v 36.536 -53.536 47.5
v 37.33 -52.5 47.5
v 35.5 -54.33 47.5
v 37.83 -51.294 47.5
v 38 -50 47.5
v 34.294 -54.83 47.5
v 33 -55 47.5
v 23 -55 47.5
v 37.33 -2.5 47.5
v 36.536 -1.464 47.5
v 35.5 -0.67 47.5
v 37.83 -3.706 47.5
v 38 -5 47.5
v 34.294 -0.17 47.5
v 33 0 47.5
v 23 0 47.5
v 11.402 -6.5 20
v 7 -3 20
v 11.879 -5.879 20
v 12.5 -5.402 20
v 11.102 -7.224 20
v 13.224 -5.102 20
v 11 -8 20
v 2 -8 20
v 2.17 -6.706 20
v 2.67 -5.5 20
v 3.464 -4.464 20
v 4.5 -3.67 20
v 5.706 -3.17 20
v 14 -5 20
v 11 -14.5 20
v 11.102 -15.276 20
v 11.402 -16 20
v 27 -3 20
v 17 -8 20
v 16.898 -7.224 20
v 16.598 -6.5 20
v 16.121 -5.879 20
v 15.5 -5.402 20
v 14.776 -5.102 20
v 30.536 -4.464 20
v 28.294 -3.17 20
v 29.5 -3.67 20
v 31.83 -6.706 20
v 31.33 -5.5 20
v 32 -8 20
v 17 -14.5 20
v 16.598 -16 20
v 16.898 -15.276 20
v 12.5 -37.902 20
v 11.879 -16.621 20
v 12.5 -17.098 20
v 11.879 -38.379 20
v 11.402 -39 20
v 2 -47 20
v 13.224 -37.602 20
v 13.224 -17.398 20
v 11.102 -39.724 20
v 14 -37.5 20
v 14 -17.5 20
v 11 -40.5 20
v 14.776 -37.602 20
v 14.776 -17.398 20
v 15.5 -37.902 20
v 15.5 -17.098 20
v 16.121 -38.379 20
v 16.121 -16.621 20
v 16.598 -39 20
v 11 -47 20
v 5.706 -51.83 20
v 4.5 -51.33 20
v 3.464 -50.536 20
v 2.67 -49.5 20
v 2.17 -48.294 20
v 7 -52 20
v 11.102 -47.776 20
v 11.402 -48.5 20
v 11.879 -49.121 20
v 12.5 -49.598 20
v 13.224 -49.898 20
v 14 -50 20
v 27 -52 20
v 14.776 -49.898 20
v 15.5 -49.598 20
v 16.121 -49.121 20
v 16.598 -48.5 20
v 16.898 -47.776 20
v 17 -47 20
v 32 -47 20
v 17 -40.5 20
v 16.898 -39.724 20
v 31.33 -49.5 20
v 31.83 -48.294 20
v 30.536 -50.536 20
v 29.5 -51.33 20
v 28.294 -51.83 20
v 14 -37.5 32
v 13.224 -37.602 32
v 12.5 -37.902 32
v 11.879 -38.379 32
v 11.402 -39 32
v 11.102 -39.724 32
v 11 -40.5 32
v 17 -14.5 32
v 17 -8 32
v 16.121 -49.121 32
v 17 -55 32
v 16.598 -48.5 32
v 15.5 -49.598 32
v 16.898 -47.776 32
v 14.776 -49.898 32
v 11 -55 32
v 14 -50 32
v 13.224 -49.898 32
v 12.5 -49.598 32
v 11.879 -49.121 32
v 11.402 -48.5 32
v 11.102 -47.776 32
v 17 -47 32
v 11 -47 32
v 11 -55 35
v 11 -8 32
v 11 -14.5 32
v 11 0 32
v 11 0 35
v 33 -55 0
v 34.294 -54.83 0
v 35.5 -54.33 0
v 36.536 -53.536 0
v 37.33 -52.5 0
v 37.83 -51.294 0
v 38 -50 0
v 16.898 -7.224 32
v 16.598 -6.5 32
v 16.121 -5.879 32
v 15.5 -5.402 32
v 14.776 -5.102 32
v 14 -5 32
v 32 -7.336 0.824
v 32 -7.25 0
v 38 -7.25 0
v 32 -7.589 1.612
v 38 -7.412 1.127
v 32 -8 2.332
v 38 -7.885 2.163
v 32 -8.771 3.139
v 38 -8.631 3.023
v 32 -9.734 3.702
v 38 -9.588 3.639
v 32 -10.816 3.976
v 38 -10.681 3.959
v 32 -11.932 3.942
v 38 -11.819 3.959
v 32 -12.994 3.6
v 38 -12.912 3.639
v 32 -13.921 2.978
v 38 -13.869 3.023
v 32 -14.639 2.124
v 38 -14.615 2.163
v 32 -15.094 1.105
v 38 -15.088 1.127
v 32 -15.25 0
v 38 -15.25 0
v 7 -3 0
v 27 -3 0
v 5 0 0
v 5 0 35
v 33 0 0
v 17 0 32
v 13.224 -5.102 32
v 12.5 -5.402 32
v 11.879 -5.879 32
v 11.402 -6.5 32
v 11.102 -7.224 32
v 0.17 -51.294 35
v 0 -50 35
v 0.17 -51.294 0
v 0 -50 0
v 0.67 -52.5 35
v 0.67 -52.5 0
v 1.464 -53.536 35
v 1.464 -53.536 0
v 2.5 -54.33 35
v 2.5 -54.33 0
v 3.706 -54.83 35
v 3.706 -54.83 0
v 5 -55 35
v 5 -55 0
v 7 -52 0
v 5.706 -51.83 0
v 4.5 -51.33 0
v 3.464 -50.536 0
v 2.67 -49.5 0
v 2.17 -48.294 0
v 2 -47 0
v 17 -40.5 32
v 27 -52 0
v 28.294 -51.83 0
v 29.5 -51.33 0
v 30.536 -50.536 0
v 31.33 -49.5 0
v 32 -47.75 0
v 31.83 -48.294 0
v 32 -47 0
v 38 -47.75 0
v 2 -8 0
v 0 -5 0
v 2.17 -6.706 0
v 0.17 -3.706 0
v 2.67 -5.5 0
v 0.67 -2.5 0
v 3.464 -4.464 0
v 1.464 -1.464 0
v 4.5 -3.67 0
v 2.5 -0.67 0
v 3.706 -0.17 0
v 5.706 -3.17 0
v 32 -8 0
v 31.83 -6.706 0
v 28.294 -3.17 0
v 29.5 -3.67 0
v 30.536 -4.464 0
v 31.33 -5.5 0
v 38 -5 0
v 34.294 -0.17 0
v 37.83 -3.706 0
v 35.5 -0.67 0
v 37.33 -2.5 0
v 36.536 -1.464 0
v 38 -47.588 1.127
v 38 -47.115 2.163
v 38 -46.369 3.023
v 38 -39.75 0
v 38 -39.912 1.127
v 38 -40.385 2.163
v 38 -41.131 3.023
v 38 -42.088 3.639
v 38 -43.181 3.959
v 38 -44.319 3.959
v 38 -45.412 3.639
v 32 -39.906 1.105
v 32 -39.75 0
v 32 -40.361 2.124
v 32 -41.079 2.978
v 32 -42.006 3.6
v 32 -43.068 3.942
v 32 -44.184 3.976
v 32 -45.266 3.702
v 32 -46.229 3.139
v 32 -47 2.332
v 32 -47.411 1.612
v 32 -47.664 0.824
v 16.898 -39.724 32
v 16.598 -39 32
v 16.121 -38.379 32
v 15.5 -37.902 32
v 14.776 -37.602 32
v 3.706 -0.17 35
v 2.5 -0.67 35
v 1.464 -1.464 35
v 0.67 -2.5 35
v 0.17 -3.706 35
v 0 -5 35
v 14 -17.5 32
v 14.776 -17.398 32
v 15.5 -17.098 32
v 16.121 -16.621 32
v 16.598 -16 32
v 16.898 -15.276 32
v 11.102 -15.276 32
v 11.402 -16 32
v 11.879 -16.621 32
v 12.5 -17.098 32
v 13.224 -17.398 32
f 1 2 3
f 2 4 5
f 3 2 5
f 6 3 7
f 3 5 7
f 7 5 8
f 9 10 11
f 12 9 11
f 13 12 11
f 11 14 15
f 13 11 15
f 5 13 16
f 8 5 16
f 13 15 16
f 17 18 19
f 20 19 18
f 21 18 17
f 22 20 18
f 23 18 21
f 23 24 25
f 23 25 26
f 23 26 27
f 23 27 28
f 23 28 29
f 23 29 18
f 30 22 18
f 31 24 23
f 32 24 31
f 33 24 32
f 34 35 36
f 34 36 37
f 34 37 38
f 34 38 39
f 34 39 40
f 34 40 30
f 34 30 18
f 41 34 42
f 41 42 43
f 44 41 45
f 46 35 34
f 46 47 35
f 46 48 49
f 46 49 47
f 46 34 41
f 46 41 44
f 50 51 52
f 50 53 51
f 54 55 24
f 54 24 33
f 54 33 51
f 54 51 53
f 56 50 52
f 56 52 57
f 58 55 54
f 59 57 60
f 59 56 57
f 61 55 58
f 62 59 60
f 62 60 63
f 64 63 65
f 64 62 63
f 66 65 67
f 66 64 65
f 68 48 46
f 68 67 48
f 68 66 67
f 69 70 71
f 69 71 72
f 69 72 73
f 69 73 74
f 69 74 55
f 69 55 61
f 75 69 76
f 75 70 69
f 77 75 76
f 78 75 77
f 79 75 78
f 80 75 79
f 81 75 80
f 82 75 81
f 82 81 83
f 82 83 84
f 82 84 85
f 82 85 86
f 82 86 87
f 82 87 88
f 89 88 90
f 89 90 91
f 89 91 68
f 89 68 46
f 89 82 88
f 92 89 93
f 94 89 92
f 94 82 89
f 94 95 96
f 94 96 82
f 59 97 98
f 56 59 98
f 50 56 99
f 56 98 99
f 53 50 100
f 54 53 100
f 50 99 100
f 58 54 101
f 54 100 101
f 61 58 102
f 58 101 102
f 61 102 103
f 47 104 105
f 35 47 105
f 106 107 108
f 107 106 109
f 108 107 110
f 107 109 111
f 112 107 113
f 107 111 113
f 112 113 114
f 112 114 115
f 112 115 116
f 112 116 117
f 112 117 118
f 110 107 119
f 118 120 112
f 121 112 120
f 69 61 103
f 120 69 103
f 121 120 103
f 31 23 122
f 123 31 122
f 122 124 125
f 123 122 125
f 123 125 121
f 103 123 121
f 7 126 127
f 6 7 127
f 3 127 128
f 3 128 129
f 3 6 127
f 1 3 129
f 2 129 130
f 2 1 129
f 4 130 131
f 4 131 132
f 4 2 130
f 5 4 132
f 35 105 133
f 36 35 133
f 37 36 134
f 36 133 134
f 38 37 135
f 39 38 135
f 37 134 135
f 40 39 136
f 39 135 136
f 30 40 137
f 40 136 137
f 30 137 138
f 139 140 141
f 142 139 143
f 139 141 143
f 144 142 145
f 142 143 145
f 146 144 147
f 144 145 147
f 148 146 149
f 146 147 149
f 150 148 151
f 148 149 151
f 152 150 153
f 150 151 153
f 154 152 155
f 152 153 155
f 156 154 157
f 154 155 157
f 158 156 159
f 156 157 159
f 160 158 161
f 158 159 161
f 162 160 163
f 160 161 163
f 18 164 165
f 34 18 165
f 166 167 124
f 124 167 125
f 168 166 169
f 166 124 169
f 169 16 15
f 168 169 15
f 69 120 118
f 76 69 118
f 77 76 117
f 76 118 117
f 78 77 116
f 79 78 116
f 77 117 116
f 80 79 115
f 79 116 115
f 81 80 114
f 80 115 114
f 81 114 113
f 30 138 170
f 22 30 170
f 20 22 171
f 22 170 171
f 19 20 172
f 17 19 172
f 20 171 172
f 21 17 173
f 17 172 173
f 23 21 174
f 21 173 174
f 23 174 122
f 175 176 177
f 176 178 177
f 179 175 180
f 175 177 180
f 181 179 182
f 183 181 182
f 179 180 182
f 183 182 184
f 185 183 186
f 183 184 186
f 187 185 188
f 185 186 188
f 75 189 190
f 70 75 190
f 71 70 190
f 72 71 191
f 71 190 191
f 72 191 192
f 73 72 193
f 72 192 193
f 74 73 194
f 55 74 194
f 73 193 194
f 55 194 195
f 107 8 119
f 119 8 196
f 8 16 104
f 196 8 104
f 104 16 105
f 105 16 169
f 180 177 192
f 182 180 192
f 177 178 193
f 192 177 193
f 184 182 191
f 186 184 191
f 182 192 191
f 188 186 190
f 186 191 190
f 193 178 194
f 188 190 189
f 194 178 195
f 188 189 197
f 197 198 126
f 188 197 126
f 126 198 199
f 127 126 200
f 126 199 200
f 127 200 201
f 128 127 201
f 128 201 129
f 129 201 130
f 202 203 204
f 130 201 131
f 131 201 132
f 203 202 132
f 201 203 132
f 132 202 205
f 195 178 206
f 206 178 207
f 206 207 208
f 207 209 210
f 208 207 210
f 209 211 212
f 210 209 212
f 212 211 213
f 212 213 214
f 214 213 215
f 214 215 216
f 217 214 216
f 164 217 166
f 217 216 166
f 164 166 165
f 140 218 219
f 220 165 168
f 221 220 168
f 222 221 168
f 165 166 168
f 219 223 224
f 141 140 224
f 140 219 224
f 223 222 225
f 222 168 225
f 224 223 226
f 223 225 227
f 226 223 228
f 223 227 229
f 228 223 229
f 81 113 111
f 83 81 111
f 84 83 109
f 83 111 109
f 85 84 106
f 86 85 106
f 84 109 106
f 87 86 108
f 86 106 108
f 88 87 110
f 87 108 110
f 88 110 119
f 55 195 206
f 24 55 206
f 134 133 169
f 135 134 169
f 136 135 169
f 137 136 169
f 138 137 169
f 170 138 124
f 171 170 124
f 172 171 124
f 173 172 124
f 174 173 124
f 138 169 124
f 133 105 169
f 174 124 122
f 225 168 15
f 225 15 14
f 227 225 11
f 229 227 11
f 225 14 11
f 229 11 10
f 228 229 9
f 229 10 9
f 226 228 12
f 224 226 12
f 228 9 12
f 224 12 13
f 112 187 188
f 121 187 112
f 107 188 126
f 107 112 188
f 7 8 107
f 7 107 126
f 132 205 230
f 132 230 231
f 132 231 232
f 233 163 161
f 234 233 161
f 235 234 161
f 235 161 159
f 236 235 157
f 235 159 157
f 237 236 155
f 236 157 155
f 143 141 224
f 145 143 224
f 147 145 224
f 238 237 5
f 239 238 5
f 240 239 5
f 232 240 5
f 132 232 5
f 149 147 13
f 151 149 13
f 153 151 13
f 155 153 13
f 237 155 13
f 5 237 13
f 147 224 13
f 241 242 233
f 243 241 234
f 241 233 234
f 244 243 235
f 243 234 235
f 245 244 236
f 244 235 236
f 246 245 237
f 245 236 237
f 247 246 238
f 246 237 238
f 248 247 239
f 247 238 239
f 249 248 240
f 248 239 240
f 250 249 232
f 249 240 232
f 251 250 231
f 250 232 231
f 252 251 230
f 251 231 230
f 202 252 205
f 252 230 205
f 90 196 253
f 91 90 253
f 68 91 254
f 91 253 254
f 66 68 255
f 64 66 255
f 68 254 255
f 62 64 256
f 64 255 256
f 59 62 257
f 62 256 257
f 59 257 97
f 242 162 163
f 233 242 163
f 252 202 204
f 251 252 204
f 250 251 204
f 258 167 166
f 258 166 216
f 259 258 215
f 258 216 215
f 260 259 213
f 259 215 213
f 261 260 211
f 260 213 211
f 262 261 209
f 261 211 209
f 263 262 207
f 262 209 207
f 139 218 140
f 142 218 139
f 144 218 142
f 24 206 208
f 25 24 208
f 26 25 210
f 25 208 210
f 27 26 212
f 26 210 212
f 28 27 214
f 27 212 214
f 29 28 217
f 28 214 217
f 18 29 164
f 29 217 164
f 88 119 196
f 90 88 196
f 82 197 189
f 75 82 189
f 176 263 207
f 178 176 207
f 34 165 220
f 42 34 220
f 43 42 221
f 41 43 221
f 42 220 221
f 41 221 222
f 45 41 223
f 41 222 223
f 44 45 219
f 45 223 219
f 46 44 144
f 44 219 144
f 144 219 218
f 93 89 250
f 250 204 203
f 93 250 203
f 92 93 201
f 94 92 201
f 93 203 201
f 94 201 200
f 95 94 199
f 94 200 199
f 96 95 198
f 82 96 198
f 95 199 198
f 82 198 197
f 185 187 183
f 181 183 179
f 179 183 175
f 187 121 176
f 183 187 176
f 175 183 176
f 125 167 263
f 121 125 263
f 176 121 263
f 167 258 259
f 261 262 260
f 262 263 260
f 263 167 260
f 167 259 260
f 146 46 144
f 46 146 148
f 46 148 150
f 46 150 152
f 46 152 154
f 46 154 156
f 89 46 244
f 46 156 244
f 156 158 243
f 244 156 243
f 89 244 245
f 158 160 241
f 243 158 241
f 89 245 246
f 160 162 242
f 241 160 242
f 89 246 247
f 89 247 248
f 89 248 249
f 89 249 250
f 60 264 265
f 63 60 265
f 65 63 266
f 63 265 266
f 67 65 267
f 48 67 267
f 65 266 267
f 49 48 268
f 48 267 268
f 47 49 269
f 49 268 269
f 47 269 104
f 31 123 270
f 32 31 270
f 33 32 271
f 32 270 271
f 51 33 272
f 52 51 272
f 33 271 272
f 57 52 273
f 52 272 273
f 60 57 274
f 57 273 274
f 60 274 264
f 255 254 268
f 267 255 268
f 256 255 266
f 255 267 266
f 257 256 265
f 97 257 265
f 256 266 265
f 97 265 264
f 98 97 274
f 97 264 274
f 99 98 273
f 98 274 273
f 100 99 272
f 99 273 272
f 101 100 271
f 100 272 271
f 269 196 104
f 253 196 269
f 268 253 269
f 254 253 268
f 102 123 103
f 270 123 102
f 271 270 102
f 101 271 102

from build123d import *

# Parameters (mm, degrees)
F1_DEPTH = 55
F3_DEPTH = 32.001
F4_R     = 5
F5_R     = 5
F7_DEPTH = 20
F9_DEPTH = 6


# Not quite as in the source:
# - a feature names something its author has since deleted; it is built from what else it names


with BuildPart() as f1:
    # F0 (on Front) → F1 (new body)
    with BuildSketch(Plane.XZ):
        Polygon((0, 35), (0, 0), (38, 0), (38, 47.5), (23, 47.5), (17, 32), (11, 32), (11, 35), align=None)
    extrude(amount=F1_DEPTH)

    # F2 (on face) → F3 (cut, through all)
    with BuildSketch(Plane.XY.offset(32)):
        with BuildLine():
            ThreePointArc((14, -5), (11.8786796564, -5.8786796564), (11, -8))
            Line((11, -8), (11, -14.5))
            ThreePointArc((11, -14.5), (11.8786796564, -16.6213203436), (14, -17.5))
            ThreePointArc((14, -17.5), (16.1213203436, -16.6213203436), (17, -14.5))
            Line((17, -14.5), (17, -8))
            ThreePointArc((17, -8), (16.1213203436, -5.8786796564), (14, -5))
        make_face()
        with BuildLine():
            ThreePointArc((14, -37.5), (11.8786796564, -38.3786796564), (11, -40.5))
            Line((11, -40.5), (11, -47))
            ThreePointArc((11, -47), (11.8786796564, -49.1213203436), (14, -50))
            ThreePointArc((14, -50), (16.1213203436, -49.1213203436), (17, -47))
            Line((17, -47), (17, -40.5))
            ThreePointArc((17, -40.5), (16.1213203436, -38.3786796564), (14, -37.5))
        make_face()
    extrude(amount=-F3_DEPTH, mode=Mode.SUBTRACT)

    # F4
    f4_edges = [f1.edges().sort_by_distance(p)[0] for p in [
        (38, -55, 23.75),
        (38, 0, 23.75),
    ]]
    fillet(f4_edges, radius=F4_R)

    # F5
    f5_edges = [f1.edges().sort_by_distance(p)[0] for p in [
        (0, 0, 17.5),
        (0, -55, 17.5),
    ]]
    fillet(f5_edges, radius=F5_R)

    # F6 (on face) → F7 (cut)
    with BuildSketch(Plane(origin=(0, 0, 0), x_dir=(1, 0, 0), z_dir=(0, 0, -1))):
        with BuildLine():
            Line((27, 52), (7, 52))
            ThreePointArc((7, 52), (3.4644660941, 50.5355339059), (2, 47))
            Line((2, 47), (2, 8))
            ThreePointArc((2, 8), (3.4644660941, 4.4644660941), (7, 3))
            Line((7, 3), (27, 3))
            ThreePointArc((27, 3), (30.5355339059, 4.4644660941), (32, 8))
            Line((32, 8), (32, 47))
            ThreePointArc((32, 47), (30.5355339059, 50.5355339059), (27, 52))
        make_face()
        with BuildLine():
            ThreePointArc((17, 8), (14, 5), (11, 8))
            Line((11, 8), (11, 14.5))
            ThreePointArc((11, 14.5), (14, 17.5), (17, 14.5))
            Line((17, 14.5), (17, 8))
        make_face(mode=Mode.SUBTRACT)
        with BuildLine():
            Line((17, 47), (17, 40.5))
            ThreePointArc((17, 40.5), (14, 37.5), (11, 40.5))
            Line((11, 40.5), (11, 47))
            ThreePointArc((11, 47), (14, 50), (17, 47))
        make_face(mode=Mode.SUBTRACT)
    extrude(amount=-F7_DEPTH, mode=Mode.SUBTRACT)

    # F8 (on face) → F9 (cut)
    with BuildSketch(Plane.YZ.offset(38)):
        with BuildLine():
            Line((-47.75, 0), (-39.75, 0))
            ThreePointArc((-39.75, 0), (-43.75, 4), (-47.75, 0))
        make_face()
        with BuildLine():
            ThreePointArc((-7.25, 0), (-11.25, 4), (-15.25, 0))
            Line((-15.25, 0), (-7.25, 0))
        make_face()
    extrude(amount=-F9_DEPTH, mode=Mode.SUBTRACT)


solid = f1.part
